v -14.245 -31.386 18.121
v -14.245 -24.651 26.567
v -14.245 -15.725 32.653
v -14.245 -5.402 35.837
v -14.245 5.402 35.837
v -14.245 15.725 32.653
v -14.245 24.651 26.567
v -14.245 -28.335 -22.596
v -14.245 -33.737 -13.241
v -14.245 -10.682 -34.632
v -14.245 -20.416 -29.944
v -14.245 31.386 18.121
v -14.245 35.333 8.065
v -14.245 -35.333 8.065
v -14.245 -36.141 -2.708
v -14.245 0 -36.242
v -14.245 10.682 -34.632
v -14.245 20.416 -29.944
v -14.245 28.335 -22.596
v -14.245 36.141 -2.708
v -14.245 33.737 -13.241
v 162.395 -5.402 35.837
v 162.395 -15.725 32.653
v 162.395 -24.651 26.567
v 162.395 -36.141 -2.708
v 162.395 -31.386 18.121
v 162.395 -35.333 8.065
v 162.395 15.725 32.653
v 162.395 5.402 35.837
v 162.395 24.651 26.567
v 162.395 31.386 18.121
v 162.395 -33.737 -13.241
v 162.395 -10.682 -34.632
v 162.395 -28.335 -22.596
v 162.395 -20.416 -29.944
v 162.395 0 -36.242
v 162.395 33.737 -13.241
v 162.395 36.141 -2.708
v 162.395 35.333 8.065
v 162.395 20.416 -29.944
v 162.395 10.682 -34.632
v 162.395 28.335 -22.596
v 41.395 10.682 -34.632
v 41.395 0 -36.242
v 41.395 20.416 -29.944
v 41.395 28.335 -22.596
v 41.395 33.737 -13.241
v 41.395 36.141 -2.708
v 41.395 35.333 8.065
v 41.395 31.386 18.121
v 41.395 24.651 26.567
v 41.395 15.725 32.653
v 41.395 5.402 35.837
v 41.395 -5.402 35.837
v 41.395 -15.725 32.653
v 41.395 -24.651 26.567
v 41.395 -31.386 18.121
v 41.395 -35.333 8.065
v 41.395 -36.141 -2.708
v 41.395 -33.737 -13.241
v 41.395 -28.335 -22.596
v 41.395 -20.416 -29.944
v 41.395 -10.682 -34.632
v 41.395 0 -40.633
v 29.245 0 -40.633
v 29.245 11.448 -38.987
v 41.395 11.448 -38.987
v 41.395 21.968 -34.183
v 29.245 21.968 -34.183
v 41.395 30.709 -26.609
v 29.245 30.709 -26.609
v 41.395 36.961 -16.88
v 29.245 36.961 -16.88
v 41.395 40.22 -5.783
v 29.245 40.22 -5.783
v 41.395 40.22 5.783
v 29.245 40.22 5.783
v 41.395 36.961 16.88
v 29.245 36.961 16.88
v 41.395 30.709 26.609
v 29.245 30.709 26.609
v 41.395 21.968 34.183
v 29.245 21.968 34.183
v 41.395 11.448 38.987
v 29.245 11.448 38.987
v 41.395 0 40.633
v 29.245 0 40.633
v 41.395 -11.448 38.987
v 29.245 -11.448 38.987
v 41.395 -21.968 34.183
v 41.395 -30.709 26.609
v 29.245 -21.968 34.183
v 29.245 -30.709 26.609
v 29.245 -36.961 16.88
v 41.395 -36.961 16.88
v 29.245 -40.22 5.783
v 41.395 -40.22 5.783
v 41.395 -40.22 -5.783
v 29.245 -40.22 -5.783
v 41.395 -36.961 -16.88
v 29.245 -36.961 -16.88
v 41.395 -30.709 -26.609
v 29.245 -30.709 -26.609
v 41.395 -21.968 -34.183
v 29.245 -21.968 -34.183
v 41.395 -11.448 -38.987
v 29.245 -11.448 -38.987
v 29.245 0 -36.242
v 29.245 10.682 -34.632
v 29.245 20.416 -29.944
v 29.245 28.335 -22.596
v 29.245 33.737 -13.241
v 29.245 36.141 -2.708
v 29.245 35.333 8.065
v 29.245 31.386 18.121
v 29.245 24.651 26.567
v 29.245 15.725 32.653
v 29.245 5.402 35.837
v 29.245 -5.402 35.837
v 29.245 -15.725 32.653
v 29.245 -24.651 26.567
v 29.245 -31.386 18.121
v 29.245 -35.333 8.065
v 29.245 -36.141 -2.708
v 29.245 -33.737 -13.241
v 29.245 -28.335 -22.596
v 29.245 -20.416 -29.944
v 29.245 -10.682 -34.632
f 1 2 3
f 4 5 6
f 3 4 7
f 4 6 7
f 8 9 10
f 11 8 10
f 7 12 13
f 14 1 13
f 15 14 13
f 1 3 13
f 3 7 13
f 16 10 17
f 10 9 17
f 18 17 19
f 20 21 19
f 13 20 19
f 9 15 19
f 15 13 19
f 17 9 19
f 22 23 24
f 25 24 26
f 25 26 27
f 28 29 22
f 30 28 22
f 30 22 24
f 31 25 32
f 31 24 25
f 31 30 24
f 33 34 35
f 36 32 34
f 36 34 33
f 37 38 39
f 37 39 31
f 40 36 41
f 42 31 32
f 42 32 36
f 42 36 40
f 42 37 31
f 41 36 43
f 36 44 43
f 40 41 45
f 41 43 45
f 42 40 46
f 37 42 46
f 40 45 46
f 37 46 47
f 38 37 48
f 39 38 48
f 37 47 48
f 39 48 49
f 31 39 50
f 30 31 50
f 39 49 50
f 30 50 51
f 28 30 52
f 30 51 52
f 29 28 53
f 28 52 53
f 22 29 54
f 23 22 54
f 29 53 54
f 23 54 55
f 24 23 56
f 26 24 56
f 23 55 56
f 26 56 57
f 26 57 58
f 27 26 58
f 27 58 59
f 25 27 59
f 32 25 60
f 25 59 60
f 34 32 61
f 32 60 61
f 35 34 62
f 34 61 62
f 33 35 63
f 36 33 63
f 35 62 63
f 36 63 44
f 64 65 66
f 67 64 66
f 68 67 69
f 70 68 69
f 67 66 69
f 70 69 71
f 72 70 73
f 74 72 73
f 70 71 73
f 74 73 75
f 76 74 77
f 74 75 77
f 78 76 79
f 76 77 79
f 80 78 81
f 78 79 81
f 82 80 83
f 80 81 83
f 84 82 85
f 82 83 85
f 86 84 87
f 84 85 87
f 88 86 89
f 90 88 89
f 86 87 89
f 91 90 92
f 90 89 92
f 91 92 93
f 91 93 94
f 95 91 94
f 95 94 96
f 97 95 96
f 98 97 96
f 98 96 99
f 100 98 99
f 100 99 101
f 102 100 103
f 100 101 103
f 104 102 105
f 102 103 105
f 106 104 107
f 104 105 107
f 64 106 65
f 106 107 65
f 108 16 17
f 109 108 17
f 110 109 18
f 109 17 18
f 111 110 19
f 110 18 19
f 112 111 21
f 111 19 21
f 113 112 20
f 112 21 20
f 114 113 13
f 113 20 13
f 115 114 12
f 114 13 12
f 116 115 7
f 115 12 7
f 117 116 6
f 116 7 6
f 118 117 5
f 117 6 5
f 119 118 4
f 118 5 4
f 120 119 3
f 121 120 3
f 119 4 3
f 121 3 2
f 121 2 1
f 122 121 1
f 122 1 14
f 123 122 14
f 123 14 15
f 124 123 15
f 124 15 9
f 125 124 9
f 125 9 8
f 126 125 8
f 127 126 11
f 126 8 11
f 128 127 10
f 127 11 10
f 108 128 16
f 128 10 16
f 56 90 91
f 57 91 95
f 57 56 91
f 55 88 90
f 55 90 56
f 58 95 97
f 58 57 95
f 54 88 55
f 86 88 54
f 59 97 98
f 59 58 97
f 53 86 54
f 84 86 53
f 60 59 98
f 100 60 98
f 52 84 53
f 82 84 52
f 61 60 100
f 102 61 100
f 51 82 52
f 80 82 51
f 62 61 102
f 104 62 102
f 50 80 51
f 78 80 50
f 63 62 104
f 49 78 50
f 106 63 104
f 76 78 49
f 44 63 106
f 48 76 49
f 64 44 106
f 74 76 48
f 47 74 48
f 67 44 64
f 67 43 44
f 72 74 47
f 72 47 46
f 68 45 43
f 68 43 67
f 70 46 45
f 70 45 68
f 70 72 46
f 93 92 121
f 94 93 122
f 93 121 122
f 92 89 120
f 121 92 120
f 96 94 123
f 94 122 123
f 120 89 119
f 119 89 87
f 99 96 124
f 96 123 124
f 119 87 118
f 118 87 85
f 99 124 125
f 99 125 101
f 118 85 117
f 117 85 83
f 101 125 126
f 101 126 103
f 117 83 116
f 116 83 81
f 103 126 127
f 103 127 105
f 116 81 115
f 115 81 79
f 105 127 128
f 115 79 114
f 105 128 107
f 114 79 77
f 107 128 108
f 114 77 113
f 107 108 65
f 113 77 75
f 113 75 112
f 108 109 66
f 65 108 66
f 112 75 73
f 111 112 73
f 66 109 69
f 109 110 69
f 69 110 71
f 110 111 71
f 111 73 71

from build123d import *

# Parameters (mm, degrees)
SKETCH1_R           = 12.5
BOSS_EXTRUDE1_DEPTH = 15
SCALE1_SCALE        = 1.9329
SCALE2_SCALE        = 1.5
SKETCH3_R           = 40.633377722
BOSS_EXTRUDE2_DEPTH = 12.1499924
SKETCH4_R           = 36.241875
BOSS_EXTRUDE3_DEPTH = 50
SKETCH5_R           = 36.241875
BOSS_EXTRUDE4_DEPTH = 71


with BuildPart() as part:
    # Sketch1 → Boss-Extrude1 (new body)
    with BuildSketch(Plane(origin=(0, 0, 0), x_dir=(0, 0, -1), z_dir=(1, 0, 0))):
        Circle(SKETCH1_R)
    extrude(amount=BOSS_EXTRUDE1_DEPTH)


with BuildPart() as part_1:
    # Scale1: scaled about (7.5, 0, 0)
    add(part.part.scale(SCALE1_SCALE).moved(Location((-6.99675, 0, 0))))


with BuildPart() as part_2:
    # Scale2: scaled about (7.5, 0, 0)
    add(part_1.part.scale(SCALE2_SCALE).moved(Location((-3.75, 0, 0))))

    # Sketch3 → Boss-Extrude2 (add)
    with BuildSketch(Plane(origin=(29.245125, 0, 0), x_dir=(0, 0, -1), z_dir=(1, 0, 0))):
        Circle(SKETCH3_R)
    extrude(amount=BOSS_EXTRUDE2_DEPTH)

    # Sketch4 → Boss-Extrude3 (add)
    with BuildSketch(Plane(origin=(41.3951174, 0, 0), x_dir=(0, 0, -1), z_dir=(1, 0, 0))):
        Circle(SKETCH4_R)
    extrude(amount=BOSS_EXTRUDE3_DEPTH)

    # Sketch5 → Boss-Extrude4 (add)
    with BuildSketch(Plane(origin=(91.3951174, 0, 0), x_dir=(0, 0, -1), z_dir=(1, 0, 0))):
        Circle(SKETCH5_R)
    extrude(amount=BOSS_EXTRUDE4_DEPTH)


solid = part_2.part
